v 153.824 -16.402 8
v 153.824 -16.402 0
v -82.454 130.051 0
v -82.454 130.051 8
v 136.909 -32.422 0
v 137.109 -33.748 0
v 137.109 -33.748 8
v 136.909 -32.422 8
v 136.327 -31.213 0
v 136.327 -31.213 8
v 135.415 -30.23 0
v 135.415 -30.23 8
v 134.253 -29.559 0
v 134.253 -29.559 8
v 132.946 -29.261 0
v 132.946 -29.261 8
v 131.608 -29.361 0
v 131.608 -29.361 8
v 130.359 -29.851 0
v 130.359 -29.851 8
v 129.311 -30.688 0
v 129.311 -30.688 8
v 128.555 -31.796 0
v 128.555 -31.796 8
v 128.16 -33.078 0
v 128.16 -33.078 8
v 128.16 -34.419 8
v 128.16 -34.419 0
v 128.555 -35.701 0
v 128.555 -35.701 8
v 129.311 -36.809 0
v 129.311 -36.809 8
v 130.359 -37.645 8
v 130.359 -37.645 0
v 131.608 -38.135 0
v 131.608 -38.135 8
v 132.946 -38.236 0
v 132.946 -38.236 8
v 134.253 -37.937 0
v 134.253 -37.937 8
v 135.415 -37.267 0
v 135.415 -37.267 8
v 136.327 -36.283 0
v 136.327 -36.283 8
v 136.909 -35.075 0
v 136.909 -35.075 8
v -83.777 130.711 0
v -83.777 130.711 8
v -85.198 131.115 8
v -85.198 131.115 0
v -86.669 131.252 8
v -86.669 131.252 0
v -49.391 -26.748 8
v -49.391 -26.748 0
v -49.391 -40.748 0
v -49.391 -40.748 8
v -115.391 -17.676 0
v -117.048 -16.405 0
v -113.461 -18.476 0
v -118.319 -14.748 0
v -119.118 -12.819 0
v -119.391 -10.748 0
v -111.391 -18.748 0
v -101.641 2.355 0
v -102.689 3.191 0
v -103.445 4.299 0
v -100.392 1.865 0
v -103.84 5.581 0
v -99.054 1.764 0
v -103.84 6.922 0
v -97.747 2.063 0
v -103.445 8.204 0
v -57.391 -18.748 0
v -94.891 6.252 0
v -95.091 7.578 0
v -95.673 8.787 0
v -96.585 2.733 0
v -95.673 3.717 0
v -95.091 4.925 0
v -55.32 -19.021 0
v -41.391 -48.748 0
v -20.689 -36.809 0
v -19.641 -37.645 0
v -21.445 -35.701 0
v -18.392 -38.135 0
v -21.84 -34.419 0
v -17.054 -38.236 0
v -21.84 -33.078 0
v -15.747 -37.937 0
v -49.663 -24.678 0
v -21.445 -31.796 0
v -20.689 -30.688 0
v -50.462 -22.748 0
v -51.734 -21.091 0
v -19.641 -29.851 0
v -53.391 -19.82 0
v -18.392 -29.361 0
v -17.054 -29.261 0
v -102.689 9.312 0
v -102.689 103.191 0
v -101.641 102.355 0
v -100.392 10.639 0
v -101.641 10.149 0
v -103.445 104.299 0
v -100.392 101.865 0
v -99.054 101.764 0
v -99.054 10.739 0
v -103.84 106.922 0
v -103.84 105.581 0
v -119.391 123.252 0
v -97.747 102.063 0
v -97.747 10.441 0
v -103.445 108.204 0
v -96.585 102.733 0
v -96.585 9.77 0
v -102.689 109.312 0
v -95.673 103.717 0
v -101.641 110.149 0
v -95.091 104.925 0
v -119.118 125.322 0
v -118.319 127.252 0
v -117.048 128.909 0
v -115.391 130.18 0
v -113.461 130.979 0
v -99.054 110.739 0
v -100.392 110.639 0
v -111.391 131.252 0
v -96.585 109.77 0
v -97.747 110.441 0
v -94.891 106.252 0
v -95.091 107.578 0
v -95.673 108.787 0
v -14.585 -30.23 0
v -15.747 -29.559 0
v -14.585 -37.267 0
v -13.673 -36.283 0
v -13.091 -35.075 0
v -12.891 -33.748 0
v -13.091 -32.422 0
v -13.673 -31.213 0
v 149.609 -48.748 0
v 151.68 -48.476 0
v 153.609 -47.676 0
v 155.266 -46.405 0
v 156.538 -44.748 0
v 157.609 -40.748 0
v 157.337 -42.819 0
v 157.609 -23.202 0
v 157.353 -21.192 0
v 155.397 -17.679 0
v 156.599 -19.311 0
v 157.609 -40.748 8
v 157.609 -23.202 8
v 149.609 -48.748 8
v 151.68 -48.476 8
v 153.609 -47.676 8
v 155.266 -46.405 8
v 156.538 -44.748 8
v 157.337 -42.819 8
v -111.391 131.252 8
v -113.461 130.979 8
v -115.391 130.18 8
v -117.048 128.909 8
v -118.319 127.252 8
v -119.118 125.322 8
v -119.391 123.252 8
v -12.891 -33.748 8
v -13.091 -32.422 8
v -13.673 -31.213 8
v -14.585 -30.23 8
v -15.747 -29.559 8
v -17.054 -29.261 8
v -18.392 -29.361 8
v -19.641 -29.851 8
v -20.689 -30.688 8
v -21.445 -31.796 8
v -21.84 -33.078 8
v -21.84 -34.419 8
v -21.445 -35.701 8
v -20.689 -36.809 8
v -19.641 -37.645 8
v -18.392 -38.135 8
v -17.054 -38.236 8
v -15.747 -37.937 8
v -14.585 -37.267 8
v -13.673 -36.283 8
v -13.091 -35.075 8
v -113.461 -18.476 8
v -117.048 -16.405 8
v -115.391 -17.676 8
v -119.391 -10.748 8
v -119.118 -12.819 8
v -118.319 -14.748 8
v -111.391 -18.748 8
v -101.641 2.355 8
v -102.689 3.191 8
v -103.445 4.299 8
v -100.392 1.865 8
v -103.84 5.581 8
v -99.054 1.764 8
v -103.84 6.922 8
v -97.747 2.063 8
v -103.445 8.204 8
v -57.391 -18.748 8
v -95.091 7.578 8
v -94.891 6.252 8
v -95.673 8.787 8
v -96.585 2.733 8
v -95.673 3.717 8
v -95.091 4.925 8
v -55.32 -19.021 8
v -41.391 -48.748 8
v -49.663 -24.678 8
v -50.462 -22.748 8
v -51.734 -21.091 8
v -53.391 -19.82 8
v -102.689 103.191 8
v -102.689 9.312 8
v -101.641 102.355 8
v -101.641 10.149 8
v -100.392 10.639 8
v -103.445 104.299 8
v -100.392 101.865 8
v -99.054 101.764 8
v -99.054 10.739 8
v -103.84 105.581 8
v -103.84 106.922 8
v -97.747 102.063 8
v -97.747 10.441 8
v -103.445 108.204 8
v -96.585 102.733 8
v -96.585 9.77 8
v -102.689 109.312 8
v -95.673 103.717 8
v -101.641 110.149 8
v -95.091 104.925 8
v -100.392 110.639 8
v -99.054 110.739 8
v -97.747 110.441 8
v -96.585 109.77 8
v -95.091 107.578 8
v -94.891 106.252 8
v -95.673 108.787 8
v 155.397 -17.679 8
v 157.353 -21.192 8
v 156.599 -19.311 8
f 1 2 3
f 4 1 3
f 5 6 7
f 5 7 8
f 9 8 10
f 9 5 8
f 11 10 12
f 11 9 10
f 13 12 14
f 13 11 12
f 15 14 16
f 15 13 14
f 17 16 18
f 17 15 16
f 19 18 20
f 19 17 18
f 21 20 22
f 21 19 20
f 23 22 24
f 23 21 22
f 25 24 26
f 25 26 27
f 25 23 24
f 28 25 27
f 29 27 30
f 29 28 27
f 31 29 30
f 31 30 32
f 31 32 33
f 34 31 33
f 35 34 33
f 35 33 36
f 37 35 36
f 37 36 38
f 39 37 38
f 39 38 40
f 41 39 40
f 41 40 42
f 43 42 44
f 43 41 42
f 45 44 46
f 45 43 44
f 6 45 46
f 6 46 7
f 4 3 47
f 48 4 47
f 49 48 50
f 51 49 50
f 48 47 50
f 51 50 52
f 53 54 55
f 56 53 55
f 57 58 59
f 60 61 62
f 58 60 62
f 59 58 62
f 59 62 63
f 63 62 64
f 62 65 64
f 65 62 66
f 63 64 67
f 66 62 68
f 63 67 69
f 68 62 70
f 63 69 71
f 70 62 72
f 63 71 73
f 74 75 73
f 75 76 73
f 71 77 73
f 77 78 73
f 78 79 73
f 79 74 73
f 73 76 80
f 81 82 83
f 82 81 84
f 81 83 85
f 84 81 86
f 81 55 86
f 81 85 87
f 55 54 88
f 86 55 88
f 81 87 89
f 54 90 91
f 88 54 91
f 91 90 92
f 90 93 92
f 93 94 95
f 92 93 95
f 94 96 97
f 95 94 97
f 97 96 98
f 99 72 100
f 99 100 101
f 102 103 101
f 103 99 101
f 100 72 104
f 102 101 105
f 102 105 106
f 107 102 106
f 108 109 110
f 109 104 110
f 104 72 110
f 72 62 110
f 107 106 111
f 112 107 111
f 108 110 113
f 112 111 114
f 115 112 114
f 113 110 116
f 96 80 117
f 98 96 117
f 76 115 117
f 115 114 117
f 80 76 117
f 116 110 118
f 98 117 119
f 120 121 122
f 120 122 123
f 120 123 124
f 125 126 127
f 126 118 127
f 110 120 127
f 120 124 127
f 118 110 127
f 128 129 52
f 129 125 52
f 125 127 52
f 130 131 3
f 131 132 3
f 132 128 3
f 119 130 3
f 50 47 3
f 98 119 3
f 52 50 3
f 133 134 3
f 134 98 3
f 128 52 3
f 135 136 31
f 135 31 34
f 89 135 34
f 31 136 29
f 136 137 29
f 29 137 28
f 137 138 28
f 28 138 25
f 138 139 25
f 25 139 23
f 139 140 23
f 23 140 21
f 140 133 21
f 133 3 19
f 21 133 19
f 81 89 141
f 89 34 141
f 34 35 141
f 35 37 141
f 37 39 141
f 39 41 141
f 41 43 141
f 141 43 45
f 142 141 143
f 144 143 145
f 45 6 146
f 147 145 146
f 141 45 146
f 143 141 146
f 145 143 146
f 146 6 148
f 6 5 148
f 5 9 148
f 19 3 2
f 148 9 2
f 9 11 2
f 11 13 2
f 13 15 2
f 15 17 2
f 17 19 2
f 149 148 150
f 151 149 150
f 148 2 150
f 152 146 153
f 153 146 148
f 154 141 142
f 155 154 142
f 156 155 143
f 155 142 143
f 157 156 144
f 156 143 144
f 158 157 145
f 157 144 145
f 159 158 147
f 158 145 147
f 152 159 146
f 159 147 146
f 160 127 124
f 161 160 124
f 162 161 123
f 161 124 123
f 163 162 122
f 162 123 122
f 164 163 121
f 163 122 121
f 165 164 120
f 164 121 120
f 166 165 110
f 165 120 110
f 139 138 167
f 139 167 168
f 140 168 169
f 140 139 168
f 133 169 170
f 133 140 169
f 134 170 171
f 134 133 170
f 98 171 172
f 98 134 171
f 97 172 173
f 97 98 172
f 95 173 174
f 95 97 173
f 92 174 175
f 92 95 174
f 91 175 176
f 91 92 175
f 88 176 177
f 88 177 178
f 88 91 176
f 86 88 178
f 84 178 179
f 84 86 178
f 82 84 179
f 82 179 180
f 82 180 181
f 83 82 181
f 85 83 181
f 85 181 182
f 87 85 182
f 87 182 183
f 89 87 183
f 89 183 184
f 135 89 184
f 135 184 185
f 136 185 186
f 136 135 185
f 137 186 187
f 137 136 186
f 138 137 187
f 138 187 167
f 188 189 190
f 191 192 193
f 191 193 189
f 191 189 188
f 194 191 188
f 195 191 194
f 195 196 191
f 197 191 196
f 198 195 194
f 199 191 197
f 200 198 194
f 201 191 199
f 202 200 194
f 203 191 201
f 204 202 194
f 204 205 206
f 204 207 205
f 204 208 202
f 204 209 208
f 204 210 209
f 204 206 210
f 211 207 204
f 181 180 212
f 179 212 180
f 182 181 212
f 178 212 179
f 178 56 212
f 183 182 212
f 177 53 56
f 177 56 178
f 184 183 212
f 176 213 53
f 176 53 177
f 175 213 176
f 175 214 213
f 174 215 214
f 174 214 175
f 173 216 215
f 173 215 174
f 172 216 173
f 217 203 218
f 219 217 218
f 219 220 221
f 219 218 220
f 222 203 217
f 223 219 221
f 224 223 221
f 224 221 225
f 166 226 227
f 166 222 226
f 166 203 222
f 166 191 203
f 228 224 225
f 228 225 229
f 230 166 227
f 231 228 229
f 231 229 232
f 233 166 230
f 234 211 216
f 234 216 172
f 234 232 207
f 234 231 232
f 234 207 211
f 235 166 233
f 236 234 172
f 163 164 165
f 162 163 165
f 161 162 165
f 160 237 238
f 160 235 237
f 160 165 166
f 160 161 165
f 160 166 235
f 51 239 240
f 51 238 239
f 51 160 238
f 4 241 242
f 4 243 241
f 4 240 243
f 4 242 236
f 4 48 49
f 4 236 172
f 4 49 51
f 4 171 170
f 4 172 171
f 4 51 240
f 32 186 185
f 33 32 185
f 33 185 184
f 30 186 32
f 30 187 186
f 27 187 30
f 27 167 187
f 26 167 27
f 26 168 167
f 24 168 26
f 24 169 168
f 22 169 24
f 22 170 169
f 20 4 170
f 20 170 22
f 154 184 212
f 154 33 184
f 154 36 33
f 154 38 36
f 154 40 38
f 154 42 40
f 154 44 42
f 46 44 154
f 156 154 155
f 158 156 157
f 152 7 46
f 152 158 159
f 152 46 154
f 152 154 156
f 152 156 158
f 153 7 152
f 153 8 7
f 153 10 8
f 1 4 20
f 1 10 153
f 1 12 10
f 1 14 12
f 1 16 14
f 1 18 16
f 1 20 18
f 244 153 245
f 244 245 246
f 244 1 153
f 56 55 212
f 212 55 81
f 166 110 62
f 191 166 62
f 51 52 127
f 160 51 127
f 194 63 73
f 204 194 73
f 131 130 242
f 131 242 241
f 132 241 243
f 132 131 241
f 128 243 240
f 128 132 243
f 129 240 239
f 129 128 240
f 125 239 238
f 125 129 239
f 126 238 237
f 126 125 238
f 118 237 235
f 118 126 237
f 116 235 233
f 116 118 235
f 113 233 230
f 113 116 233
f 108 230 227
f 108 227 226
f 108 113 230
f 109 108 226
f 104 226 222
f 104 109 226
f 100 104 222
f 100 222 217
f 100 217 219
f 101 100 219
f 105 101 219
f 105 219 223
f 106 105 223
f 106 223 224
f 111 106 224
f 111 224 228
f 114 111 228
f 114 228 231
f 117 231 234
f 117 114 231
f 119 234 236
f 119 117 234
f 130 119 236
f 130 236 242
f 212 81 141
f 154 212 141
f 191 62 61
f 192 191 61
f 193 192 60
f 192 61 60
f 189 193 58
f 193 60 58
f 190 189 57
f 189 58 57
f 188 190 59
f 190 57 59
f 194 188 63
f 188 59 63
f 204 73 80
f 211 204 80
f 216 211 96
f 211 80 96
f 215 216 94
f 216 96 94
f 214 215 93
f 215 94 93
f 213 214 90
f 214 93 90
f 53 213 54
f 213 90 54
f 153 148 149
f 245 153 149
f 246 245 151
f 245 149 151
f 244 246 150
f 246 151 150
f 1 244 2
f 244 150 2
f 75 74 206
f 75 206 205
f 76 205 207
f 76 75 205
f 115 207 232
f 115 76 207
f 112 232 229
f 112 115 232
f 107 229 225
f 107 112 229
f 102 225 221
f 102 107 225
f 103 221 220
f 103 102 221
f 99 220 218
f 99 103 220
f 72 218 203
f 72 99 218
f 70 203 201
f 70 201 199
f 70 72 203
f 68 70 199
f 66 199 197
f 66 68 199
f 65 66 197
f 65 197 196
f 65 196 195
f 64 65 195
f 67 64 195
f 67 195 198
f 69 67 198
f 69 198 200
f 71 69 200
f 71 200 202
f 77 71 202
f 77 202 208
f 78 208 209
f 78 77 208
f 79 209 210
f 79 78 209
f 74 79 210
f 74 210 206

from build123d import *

# Parameters (mm, degrees)
SKETCH1_R           = 4.5
BOSS_EXTRUDE1_DEPTH = 8


with BuildPart() as part:
    # Sketch1 → Boss-Extrude1 (new body)
    with BuildSketch(Plane.XY):
        with BuildLine():
            Line((-119.390660592, 123.251708428), (-119.390660592, -10.748291572))
            ThreePointArc((-119.390660592, -10.748291572), (-117.047514842, -16.405145821), (-111.390660592, -18.748291572))
            Line((-111.390660592, -18.748291572), (-57.390660592, -18.748291572))
            ThreePointArc((-57.390660592, -18.748291572), (-51.733806343, -21.091437322), (-49.390660592, -26.748291572))
            Line((-49.390660592, -26.748291572), (-49.390660592, -40.748291572))
            Line((-49.390660592, -40.748291572), (-41.390660592, -48.748291572))
            Line((-41.390660592, -48.748291572), (149.609339408, -48.748291572))
            ThreePointArc((149.609339408, -48.748291572), (155.266193657, -46.405145821), (157.609339408, -40.748291572))
            Line((157.609339408, -40.748291572), (157.609339408, -23.201759464))
            ThreePointArc((157.609339408, -23.201759464), (156.599247983, -19.310592788), (153.824044881, -16.402034634))
            Line((153.824044881, -16.402034634), (-82.454216652, 130.051433259))
            ThreePointArc((-82.454216652, 130.051433259), (-84.477780716, 130.945790526), (-86.668922126, 131.251708428))
            Line((-86.668922126, 131.251708428), (-111.390660592, 131.251708428))
            ThreePointArc((-111.390660592, 131.251708428), (-117.047514842, 128.908562678), (-119.390660592, 123.251708428))
        make_face()
        with Locations((-99.390660592, 106.251708428)):
            Circle(SKETCH1_R, mode=Mode.SUBTRACT)
        with Locations((-99.390660592, 6.251708428)):
            Circle(SKETCH1_R, mode=Mode.SUBTRACT)
        with Locations((-17.390660592, -33.748291572)):
            Circle(SKETCH1_R, mode=Mode.SUBTRACT)
        with Locations((132.609339408, -33.748291572)):
            Circle(SKETCH1_R, mode=Mode.SUBTRACT)
    extrude(amount=BOSS_EXTRUDE1_DEPTH)


solid = part.part
